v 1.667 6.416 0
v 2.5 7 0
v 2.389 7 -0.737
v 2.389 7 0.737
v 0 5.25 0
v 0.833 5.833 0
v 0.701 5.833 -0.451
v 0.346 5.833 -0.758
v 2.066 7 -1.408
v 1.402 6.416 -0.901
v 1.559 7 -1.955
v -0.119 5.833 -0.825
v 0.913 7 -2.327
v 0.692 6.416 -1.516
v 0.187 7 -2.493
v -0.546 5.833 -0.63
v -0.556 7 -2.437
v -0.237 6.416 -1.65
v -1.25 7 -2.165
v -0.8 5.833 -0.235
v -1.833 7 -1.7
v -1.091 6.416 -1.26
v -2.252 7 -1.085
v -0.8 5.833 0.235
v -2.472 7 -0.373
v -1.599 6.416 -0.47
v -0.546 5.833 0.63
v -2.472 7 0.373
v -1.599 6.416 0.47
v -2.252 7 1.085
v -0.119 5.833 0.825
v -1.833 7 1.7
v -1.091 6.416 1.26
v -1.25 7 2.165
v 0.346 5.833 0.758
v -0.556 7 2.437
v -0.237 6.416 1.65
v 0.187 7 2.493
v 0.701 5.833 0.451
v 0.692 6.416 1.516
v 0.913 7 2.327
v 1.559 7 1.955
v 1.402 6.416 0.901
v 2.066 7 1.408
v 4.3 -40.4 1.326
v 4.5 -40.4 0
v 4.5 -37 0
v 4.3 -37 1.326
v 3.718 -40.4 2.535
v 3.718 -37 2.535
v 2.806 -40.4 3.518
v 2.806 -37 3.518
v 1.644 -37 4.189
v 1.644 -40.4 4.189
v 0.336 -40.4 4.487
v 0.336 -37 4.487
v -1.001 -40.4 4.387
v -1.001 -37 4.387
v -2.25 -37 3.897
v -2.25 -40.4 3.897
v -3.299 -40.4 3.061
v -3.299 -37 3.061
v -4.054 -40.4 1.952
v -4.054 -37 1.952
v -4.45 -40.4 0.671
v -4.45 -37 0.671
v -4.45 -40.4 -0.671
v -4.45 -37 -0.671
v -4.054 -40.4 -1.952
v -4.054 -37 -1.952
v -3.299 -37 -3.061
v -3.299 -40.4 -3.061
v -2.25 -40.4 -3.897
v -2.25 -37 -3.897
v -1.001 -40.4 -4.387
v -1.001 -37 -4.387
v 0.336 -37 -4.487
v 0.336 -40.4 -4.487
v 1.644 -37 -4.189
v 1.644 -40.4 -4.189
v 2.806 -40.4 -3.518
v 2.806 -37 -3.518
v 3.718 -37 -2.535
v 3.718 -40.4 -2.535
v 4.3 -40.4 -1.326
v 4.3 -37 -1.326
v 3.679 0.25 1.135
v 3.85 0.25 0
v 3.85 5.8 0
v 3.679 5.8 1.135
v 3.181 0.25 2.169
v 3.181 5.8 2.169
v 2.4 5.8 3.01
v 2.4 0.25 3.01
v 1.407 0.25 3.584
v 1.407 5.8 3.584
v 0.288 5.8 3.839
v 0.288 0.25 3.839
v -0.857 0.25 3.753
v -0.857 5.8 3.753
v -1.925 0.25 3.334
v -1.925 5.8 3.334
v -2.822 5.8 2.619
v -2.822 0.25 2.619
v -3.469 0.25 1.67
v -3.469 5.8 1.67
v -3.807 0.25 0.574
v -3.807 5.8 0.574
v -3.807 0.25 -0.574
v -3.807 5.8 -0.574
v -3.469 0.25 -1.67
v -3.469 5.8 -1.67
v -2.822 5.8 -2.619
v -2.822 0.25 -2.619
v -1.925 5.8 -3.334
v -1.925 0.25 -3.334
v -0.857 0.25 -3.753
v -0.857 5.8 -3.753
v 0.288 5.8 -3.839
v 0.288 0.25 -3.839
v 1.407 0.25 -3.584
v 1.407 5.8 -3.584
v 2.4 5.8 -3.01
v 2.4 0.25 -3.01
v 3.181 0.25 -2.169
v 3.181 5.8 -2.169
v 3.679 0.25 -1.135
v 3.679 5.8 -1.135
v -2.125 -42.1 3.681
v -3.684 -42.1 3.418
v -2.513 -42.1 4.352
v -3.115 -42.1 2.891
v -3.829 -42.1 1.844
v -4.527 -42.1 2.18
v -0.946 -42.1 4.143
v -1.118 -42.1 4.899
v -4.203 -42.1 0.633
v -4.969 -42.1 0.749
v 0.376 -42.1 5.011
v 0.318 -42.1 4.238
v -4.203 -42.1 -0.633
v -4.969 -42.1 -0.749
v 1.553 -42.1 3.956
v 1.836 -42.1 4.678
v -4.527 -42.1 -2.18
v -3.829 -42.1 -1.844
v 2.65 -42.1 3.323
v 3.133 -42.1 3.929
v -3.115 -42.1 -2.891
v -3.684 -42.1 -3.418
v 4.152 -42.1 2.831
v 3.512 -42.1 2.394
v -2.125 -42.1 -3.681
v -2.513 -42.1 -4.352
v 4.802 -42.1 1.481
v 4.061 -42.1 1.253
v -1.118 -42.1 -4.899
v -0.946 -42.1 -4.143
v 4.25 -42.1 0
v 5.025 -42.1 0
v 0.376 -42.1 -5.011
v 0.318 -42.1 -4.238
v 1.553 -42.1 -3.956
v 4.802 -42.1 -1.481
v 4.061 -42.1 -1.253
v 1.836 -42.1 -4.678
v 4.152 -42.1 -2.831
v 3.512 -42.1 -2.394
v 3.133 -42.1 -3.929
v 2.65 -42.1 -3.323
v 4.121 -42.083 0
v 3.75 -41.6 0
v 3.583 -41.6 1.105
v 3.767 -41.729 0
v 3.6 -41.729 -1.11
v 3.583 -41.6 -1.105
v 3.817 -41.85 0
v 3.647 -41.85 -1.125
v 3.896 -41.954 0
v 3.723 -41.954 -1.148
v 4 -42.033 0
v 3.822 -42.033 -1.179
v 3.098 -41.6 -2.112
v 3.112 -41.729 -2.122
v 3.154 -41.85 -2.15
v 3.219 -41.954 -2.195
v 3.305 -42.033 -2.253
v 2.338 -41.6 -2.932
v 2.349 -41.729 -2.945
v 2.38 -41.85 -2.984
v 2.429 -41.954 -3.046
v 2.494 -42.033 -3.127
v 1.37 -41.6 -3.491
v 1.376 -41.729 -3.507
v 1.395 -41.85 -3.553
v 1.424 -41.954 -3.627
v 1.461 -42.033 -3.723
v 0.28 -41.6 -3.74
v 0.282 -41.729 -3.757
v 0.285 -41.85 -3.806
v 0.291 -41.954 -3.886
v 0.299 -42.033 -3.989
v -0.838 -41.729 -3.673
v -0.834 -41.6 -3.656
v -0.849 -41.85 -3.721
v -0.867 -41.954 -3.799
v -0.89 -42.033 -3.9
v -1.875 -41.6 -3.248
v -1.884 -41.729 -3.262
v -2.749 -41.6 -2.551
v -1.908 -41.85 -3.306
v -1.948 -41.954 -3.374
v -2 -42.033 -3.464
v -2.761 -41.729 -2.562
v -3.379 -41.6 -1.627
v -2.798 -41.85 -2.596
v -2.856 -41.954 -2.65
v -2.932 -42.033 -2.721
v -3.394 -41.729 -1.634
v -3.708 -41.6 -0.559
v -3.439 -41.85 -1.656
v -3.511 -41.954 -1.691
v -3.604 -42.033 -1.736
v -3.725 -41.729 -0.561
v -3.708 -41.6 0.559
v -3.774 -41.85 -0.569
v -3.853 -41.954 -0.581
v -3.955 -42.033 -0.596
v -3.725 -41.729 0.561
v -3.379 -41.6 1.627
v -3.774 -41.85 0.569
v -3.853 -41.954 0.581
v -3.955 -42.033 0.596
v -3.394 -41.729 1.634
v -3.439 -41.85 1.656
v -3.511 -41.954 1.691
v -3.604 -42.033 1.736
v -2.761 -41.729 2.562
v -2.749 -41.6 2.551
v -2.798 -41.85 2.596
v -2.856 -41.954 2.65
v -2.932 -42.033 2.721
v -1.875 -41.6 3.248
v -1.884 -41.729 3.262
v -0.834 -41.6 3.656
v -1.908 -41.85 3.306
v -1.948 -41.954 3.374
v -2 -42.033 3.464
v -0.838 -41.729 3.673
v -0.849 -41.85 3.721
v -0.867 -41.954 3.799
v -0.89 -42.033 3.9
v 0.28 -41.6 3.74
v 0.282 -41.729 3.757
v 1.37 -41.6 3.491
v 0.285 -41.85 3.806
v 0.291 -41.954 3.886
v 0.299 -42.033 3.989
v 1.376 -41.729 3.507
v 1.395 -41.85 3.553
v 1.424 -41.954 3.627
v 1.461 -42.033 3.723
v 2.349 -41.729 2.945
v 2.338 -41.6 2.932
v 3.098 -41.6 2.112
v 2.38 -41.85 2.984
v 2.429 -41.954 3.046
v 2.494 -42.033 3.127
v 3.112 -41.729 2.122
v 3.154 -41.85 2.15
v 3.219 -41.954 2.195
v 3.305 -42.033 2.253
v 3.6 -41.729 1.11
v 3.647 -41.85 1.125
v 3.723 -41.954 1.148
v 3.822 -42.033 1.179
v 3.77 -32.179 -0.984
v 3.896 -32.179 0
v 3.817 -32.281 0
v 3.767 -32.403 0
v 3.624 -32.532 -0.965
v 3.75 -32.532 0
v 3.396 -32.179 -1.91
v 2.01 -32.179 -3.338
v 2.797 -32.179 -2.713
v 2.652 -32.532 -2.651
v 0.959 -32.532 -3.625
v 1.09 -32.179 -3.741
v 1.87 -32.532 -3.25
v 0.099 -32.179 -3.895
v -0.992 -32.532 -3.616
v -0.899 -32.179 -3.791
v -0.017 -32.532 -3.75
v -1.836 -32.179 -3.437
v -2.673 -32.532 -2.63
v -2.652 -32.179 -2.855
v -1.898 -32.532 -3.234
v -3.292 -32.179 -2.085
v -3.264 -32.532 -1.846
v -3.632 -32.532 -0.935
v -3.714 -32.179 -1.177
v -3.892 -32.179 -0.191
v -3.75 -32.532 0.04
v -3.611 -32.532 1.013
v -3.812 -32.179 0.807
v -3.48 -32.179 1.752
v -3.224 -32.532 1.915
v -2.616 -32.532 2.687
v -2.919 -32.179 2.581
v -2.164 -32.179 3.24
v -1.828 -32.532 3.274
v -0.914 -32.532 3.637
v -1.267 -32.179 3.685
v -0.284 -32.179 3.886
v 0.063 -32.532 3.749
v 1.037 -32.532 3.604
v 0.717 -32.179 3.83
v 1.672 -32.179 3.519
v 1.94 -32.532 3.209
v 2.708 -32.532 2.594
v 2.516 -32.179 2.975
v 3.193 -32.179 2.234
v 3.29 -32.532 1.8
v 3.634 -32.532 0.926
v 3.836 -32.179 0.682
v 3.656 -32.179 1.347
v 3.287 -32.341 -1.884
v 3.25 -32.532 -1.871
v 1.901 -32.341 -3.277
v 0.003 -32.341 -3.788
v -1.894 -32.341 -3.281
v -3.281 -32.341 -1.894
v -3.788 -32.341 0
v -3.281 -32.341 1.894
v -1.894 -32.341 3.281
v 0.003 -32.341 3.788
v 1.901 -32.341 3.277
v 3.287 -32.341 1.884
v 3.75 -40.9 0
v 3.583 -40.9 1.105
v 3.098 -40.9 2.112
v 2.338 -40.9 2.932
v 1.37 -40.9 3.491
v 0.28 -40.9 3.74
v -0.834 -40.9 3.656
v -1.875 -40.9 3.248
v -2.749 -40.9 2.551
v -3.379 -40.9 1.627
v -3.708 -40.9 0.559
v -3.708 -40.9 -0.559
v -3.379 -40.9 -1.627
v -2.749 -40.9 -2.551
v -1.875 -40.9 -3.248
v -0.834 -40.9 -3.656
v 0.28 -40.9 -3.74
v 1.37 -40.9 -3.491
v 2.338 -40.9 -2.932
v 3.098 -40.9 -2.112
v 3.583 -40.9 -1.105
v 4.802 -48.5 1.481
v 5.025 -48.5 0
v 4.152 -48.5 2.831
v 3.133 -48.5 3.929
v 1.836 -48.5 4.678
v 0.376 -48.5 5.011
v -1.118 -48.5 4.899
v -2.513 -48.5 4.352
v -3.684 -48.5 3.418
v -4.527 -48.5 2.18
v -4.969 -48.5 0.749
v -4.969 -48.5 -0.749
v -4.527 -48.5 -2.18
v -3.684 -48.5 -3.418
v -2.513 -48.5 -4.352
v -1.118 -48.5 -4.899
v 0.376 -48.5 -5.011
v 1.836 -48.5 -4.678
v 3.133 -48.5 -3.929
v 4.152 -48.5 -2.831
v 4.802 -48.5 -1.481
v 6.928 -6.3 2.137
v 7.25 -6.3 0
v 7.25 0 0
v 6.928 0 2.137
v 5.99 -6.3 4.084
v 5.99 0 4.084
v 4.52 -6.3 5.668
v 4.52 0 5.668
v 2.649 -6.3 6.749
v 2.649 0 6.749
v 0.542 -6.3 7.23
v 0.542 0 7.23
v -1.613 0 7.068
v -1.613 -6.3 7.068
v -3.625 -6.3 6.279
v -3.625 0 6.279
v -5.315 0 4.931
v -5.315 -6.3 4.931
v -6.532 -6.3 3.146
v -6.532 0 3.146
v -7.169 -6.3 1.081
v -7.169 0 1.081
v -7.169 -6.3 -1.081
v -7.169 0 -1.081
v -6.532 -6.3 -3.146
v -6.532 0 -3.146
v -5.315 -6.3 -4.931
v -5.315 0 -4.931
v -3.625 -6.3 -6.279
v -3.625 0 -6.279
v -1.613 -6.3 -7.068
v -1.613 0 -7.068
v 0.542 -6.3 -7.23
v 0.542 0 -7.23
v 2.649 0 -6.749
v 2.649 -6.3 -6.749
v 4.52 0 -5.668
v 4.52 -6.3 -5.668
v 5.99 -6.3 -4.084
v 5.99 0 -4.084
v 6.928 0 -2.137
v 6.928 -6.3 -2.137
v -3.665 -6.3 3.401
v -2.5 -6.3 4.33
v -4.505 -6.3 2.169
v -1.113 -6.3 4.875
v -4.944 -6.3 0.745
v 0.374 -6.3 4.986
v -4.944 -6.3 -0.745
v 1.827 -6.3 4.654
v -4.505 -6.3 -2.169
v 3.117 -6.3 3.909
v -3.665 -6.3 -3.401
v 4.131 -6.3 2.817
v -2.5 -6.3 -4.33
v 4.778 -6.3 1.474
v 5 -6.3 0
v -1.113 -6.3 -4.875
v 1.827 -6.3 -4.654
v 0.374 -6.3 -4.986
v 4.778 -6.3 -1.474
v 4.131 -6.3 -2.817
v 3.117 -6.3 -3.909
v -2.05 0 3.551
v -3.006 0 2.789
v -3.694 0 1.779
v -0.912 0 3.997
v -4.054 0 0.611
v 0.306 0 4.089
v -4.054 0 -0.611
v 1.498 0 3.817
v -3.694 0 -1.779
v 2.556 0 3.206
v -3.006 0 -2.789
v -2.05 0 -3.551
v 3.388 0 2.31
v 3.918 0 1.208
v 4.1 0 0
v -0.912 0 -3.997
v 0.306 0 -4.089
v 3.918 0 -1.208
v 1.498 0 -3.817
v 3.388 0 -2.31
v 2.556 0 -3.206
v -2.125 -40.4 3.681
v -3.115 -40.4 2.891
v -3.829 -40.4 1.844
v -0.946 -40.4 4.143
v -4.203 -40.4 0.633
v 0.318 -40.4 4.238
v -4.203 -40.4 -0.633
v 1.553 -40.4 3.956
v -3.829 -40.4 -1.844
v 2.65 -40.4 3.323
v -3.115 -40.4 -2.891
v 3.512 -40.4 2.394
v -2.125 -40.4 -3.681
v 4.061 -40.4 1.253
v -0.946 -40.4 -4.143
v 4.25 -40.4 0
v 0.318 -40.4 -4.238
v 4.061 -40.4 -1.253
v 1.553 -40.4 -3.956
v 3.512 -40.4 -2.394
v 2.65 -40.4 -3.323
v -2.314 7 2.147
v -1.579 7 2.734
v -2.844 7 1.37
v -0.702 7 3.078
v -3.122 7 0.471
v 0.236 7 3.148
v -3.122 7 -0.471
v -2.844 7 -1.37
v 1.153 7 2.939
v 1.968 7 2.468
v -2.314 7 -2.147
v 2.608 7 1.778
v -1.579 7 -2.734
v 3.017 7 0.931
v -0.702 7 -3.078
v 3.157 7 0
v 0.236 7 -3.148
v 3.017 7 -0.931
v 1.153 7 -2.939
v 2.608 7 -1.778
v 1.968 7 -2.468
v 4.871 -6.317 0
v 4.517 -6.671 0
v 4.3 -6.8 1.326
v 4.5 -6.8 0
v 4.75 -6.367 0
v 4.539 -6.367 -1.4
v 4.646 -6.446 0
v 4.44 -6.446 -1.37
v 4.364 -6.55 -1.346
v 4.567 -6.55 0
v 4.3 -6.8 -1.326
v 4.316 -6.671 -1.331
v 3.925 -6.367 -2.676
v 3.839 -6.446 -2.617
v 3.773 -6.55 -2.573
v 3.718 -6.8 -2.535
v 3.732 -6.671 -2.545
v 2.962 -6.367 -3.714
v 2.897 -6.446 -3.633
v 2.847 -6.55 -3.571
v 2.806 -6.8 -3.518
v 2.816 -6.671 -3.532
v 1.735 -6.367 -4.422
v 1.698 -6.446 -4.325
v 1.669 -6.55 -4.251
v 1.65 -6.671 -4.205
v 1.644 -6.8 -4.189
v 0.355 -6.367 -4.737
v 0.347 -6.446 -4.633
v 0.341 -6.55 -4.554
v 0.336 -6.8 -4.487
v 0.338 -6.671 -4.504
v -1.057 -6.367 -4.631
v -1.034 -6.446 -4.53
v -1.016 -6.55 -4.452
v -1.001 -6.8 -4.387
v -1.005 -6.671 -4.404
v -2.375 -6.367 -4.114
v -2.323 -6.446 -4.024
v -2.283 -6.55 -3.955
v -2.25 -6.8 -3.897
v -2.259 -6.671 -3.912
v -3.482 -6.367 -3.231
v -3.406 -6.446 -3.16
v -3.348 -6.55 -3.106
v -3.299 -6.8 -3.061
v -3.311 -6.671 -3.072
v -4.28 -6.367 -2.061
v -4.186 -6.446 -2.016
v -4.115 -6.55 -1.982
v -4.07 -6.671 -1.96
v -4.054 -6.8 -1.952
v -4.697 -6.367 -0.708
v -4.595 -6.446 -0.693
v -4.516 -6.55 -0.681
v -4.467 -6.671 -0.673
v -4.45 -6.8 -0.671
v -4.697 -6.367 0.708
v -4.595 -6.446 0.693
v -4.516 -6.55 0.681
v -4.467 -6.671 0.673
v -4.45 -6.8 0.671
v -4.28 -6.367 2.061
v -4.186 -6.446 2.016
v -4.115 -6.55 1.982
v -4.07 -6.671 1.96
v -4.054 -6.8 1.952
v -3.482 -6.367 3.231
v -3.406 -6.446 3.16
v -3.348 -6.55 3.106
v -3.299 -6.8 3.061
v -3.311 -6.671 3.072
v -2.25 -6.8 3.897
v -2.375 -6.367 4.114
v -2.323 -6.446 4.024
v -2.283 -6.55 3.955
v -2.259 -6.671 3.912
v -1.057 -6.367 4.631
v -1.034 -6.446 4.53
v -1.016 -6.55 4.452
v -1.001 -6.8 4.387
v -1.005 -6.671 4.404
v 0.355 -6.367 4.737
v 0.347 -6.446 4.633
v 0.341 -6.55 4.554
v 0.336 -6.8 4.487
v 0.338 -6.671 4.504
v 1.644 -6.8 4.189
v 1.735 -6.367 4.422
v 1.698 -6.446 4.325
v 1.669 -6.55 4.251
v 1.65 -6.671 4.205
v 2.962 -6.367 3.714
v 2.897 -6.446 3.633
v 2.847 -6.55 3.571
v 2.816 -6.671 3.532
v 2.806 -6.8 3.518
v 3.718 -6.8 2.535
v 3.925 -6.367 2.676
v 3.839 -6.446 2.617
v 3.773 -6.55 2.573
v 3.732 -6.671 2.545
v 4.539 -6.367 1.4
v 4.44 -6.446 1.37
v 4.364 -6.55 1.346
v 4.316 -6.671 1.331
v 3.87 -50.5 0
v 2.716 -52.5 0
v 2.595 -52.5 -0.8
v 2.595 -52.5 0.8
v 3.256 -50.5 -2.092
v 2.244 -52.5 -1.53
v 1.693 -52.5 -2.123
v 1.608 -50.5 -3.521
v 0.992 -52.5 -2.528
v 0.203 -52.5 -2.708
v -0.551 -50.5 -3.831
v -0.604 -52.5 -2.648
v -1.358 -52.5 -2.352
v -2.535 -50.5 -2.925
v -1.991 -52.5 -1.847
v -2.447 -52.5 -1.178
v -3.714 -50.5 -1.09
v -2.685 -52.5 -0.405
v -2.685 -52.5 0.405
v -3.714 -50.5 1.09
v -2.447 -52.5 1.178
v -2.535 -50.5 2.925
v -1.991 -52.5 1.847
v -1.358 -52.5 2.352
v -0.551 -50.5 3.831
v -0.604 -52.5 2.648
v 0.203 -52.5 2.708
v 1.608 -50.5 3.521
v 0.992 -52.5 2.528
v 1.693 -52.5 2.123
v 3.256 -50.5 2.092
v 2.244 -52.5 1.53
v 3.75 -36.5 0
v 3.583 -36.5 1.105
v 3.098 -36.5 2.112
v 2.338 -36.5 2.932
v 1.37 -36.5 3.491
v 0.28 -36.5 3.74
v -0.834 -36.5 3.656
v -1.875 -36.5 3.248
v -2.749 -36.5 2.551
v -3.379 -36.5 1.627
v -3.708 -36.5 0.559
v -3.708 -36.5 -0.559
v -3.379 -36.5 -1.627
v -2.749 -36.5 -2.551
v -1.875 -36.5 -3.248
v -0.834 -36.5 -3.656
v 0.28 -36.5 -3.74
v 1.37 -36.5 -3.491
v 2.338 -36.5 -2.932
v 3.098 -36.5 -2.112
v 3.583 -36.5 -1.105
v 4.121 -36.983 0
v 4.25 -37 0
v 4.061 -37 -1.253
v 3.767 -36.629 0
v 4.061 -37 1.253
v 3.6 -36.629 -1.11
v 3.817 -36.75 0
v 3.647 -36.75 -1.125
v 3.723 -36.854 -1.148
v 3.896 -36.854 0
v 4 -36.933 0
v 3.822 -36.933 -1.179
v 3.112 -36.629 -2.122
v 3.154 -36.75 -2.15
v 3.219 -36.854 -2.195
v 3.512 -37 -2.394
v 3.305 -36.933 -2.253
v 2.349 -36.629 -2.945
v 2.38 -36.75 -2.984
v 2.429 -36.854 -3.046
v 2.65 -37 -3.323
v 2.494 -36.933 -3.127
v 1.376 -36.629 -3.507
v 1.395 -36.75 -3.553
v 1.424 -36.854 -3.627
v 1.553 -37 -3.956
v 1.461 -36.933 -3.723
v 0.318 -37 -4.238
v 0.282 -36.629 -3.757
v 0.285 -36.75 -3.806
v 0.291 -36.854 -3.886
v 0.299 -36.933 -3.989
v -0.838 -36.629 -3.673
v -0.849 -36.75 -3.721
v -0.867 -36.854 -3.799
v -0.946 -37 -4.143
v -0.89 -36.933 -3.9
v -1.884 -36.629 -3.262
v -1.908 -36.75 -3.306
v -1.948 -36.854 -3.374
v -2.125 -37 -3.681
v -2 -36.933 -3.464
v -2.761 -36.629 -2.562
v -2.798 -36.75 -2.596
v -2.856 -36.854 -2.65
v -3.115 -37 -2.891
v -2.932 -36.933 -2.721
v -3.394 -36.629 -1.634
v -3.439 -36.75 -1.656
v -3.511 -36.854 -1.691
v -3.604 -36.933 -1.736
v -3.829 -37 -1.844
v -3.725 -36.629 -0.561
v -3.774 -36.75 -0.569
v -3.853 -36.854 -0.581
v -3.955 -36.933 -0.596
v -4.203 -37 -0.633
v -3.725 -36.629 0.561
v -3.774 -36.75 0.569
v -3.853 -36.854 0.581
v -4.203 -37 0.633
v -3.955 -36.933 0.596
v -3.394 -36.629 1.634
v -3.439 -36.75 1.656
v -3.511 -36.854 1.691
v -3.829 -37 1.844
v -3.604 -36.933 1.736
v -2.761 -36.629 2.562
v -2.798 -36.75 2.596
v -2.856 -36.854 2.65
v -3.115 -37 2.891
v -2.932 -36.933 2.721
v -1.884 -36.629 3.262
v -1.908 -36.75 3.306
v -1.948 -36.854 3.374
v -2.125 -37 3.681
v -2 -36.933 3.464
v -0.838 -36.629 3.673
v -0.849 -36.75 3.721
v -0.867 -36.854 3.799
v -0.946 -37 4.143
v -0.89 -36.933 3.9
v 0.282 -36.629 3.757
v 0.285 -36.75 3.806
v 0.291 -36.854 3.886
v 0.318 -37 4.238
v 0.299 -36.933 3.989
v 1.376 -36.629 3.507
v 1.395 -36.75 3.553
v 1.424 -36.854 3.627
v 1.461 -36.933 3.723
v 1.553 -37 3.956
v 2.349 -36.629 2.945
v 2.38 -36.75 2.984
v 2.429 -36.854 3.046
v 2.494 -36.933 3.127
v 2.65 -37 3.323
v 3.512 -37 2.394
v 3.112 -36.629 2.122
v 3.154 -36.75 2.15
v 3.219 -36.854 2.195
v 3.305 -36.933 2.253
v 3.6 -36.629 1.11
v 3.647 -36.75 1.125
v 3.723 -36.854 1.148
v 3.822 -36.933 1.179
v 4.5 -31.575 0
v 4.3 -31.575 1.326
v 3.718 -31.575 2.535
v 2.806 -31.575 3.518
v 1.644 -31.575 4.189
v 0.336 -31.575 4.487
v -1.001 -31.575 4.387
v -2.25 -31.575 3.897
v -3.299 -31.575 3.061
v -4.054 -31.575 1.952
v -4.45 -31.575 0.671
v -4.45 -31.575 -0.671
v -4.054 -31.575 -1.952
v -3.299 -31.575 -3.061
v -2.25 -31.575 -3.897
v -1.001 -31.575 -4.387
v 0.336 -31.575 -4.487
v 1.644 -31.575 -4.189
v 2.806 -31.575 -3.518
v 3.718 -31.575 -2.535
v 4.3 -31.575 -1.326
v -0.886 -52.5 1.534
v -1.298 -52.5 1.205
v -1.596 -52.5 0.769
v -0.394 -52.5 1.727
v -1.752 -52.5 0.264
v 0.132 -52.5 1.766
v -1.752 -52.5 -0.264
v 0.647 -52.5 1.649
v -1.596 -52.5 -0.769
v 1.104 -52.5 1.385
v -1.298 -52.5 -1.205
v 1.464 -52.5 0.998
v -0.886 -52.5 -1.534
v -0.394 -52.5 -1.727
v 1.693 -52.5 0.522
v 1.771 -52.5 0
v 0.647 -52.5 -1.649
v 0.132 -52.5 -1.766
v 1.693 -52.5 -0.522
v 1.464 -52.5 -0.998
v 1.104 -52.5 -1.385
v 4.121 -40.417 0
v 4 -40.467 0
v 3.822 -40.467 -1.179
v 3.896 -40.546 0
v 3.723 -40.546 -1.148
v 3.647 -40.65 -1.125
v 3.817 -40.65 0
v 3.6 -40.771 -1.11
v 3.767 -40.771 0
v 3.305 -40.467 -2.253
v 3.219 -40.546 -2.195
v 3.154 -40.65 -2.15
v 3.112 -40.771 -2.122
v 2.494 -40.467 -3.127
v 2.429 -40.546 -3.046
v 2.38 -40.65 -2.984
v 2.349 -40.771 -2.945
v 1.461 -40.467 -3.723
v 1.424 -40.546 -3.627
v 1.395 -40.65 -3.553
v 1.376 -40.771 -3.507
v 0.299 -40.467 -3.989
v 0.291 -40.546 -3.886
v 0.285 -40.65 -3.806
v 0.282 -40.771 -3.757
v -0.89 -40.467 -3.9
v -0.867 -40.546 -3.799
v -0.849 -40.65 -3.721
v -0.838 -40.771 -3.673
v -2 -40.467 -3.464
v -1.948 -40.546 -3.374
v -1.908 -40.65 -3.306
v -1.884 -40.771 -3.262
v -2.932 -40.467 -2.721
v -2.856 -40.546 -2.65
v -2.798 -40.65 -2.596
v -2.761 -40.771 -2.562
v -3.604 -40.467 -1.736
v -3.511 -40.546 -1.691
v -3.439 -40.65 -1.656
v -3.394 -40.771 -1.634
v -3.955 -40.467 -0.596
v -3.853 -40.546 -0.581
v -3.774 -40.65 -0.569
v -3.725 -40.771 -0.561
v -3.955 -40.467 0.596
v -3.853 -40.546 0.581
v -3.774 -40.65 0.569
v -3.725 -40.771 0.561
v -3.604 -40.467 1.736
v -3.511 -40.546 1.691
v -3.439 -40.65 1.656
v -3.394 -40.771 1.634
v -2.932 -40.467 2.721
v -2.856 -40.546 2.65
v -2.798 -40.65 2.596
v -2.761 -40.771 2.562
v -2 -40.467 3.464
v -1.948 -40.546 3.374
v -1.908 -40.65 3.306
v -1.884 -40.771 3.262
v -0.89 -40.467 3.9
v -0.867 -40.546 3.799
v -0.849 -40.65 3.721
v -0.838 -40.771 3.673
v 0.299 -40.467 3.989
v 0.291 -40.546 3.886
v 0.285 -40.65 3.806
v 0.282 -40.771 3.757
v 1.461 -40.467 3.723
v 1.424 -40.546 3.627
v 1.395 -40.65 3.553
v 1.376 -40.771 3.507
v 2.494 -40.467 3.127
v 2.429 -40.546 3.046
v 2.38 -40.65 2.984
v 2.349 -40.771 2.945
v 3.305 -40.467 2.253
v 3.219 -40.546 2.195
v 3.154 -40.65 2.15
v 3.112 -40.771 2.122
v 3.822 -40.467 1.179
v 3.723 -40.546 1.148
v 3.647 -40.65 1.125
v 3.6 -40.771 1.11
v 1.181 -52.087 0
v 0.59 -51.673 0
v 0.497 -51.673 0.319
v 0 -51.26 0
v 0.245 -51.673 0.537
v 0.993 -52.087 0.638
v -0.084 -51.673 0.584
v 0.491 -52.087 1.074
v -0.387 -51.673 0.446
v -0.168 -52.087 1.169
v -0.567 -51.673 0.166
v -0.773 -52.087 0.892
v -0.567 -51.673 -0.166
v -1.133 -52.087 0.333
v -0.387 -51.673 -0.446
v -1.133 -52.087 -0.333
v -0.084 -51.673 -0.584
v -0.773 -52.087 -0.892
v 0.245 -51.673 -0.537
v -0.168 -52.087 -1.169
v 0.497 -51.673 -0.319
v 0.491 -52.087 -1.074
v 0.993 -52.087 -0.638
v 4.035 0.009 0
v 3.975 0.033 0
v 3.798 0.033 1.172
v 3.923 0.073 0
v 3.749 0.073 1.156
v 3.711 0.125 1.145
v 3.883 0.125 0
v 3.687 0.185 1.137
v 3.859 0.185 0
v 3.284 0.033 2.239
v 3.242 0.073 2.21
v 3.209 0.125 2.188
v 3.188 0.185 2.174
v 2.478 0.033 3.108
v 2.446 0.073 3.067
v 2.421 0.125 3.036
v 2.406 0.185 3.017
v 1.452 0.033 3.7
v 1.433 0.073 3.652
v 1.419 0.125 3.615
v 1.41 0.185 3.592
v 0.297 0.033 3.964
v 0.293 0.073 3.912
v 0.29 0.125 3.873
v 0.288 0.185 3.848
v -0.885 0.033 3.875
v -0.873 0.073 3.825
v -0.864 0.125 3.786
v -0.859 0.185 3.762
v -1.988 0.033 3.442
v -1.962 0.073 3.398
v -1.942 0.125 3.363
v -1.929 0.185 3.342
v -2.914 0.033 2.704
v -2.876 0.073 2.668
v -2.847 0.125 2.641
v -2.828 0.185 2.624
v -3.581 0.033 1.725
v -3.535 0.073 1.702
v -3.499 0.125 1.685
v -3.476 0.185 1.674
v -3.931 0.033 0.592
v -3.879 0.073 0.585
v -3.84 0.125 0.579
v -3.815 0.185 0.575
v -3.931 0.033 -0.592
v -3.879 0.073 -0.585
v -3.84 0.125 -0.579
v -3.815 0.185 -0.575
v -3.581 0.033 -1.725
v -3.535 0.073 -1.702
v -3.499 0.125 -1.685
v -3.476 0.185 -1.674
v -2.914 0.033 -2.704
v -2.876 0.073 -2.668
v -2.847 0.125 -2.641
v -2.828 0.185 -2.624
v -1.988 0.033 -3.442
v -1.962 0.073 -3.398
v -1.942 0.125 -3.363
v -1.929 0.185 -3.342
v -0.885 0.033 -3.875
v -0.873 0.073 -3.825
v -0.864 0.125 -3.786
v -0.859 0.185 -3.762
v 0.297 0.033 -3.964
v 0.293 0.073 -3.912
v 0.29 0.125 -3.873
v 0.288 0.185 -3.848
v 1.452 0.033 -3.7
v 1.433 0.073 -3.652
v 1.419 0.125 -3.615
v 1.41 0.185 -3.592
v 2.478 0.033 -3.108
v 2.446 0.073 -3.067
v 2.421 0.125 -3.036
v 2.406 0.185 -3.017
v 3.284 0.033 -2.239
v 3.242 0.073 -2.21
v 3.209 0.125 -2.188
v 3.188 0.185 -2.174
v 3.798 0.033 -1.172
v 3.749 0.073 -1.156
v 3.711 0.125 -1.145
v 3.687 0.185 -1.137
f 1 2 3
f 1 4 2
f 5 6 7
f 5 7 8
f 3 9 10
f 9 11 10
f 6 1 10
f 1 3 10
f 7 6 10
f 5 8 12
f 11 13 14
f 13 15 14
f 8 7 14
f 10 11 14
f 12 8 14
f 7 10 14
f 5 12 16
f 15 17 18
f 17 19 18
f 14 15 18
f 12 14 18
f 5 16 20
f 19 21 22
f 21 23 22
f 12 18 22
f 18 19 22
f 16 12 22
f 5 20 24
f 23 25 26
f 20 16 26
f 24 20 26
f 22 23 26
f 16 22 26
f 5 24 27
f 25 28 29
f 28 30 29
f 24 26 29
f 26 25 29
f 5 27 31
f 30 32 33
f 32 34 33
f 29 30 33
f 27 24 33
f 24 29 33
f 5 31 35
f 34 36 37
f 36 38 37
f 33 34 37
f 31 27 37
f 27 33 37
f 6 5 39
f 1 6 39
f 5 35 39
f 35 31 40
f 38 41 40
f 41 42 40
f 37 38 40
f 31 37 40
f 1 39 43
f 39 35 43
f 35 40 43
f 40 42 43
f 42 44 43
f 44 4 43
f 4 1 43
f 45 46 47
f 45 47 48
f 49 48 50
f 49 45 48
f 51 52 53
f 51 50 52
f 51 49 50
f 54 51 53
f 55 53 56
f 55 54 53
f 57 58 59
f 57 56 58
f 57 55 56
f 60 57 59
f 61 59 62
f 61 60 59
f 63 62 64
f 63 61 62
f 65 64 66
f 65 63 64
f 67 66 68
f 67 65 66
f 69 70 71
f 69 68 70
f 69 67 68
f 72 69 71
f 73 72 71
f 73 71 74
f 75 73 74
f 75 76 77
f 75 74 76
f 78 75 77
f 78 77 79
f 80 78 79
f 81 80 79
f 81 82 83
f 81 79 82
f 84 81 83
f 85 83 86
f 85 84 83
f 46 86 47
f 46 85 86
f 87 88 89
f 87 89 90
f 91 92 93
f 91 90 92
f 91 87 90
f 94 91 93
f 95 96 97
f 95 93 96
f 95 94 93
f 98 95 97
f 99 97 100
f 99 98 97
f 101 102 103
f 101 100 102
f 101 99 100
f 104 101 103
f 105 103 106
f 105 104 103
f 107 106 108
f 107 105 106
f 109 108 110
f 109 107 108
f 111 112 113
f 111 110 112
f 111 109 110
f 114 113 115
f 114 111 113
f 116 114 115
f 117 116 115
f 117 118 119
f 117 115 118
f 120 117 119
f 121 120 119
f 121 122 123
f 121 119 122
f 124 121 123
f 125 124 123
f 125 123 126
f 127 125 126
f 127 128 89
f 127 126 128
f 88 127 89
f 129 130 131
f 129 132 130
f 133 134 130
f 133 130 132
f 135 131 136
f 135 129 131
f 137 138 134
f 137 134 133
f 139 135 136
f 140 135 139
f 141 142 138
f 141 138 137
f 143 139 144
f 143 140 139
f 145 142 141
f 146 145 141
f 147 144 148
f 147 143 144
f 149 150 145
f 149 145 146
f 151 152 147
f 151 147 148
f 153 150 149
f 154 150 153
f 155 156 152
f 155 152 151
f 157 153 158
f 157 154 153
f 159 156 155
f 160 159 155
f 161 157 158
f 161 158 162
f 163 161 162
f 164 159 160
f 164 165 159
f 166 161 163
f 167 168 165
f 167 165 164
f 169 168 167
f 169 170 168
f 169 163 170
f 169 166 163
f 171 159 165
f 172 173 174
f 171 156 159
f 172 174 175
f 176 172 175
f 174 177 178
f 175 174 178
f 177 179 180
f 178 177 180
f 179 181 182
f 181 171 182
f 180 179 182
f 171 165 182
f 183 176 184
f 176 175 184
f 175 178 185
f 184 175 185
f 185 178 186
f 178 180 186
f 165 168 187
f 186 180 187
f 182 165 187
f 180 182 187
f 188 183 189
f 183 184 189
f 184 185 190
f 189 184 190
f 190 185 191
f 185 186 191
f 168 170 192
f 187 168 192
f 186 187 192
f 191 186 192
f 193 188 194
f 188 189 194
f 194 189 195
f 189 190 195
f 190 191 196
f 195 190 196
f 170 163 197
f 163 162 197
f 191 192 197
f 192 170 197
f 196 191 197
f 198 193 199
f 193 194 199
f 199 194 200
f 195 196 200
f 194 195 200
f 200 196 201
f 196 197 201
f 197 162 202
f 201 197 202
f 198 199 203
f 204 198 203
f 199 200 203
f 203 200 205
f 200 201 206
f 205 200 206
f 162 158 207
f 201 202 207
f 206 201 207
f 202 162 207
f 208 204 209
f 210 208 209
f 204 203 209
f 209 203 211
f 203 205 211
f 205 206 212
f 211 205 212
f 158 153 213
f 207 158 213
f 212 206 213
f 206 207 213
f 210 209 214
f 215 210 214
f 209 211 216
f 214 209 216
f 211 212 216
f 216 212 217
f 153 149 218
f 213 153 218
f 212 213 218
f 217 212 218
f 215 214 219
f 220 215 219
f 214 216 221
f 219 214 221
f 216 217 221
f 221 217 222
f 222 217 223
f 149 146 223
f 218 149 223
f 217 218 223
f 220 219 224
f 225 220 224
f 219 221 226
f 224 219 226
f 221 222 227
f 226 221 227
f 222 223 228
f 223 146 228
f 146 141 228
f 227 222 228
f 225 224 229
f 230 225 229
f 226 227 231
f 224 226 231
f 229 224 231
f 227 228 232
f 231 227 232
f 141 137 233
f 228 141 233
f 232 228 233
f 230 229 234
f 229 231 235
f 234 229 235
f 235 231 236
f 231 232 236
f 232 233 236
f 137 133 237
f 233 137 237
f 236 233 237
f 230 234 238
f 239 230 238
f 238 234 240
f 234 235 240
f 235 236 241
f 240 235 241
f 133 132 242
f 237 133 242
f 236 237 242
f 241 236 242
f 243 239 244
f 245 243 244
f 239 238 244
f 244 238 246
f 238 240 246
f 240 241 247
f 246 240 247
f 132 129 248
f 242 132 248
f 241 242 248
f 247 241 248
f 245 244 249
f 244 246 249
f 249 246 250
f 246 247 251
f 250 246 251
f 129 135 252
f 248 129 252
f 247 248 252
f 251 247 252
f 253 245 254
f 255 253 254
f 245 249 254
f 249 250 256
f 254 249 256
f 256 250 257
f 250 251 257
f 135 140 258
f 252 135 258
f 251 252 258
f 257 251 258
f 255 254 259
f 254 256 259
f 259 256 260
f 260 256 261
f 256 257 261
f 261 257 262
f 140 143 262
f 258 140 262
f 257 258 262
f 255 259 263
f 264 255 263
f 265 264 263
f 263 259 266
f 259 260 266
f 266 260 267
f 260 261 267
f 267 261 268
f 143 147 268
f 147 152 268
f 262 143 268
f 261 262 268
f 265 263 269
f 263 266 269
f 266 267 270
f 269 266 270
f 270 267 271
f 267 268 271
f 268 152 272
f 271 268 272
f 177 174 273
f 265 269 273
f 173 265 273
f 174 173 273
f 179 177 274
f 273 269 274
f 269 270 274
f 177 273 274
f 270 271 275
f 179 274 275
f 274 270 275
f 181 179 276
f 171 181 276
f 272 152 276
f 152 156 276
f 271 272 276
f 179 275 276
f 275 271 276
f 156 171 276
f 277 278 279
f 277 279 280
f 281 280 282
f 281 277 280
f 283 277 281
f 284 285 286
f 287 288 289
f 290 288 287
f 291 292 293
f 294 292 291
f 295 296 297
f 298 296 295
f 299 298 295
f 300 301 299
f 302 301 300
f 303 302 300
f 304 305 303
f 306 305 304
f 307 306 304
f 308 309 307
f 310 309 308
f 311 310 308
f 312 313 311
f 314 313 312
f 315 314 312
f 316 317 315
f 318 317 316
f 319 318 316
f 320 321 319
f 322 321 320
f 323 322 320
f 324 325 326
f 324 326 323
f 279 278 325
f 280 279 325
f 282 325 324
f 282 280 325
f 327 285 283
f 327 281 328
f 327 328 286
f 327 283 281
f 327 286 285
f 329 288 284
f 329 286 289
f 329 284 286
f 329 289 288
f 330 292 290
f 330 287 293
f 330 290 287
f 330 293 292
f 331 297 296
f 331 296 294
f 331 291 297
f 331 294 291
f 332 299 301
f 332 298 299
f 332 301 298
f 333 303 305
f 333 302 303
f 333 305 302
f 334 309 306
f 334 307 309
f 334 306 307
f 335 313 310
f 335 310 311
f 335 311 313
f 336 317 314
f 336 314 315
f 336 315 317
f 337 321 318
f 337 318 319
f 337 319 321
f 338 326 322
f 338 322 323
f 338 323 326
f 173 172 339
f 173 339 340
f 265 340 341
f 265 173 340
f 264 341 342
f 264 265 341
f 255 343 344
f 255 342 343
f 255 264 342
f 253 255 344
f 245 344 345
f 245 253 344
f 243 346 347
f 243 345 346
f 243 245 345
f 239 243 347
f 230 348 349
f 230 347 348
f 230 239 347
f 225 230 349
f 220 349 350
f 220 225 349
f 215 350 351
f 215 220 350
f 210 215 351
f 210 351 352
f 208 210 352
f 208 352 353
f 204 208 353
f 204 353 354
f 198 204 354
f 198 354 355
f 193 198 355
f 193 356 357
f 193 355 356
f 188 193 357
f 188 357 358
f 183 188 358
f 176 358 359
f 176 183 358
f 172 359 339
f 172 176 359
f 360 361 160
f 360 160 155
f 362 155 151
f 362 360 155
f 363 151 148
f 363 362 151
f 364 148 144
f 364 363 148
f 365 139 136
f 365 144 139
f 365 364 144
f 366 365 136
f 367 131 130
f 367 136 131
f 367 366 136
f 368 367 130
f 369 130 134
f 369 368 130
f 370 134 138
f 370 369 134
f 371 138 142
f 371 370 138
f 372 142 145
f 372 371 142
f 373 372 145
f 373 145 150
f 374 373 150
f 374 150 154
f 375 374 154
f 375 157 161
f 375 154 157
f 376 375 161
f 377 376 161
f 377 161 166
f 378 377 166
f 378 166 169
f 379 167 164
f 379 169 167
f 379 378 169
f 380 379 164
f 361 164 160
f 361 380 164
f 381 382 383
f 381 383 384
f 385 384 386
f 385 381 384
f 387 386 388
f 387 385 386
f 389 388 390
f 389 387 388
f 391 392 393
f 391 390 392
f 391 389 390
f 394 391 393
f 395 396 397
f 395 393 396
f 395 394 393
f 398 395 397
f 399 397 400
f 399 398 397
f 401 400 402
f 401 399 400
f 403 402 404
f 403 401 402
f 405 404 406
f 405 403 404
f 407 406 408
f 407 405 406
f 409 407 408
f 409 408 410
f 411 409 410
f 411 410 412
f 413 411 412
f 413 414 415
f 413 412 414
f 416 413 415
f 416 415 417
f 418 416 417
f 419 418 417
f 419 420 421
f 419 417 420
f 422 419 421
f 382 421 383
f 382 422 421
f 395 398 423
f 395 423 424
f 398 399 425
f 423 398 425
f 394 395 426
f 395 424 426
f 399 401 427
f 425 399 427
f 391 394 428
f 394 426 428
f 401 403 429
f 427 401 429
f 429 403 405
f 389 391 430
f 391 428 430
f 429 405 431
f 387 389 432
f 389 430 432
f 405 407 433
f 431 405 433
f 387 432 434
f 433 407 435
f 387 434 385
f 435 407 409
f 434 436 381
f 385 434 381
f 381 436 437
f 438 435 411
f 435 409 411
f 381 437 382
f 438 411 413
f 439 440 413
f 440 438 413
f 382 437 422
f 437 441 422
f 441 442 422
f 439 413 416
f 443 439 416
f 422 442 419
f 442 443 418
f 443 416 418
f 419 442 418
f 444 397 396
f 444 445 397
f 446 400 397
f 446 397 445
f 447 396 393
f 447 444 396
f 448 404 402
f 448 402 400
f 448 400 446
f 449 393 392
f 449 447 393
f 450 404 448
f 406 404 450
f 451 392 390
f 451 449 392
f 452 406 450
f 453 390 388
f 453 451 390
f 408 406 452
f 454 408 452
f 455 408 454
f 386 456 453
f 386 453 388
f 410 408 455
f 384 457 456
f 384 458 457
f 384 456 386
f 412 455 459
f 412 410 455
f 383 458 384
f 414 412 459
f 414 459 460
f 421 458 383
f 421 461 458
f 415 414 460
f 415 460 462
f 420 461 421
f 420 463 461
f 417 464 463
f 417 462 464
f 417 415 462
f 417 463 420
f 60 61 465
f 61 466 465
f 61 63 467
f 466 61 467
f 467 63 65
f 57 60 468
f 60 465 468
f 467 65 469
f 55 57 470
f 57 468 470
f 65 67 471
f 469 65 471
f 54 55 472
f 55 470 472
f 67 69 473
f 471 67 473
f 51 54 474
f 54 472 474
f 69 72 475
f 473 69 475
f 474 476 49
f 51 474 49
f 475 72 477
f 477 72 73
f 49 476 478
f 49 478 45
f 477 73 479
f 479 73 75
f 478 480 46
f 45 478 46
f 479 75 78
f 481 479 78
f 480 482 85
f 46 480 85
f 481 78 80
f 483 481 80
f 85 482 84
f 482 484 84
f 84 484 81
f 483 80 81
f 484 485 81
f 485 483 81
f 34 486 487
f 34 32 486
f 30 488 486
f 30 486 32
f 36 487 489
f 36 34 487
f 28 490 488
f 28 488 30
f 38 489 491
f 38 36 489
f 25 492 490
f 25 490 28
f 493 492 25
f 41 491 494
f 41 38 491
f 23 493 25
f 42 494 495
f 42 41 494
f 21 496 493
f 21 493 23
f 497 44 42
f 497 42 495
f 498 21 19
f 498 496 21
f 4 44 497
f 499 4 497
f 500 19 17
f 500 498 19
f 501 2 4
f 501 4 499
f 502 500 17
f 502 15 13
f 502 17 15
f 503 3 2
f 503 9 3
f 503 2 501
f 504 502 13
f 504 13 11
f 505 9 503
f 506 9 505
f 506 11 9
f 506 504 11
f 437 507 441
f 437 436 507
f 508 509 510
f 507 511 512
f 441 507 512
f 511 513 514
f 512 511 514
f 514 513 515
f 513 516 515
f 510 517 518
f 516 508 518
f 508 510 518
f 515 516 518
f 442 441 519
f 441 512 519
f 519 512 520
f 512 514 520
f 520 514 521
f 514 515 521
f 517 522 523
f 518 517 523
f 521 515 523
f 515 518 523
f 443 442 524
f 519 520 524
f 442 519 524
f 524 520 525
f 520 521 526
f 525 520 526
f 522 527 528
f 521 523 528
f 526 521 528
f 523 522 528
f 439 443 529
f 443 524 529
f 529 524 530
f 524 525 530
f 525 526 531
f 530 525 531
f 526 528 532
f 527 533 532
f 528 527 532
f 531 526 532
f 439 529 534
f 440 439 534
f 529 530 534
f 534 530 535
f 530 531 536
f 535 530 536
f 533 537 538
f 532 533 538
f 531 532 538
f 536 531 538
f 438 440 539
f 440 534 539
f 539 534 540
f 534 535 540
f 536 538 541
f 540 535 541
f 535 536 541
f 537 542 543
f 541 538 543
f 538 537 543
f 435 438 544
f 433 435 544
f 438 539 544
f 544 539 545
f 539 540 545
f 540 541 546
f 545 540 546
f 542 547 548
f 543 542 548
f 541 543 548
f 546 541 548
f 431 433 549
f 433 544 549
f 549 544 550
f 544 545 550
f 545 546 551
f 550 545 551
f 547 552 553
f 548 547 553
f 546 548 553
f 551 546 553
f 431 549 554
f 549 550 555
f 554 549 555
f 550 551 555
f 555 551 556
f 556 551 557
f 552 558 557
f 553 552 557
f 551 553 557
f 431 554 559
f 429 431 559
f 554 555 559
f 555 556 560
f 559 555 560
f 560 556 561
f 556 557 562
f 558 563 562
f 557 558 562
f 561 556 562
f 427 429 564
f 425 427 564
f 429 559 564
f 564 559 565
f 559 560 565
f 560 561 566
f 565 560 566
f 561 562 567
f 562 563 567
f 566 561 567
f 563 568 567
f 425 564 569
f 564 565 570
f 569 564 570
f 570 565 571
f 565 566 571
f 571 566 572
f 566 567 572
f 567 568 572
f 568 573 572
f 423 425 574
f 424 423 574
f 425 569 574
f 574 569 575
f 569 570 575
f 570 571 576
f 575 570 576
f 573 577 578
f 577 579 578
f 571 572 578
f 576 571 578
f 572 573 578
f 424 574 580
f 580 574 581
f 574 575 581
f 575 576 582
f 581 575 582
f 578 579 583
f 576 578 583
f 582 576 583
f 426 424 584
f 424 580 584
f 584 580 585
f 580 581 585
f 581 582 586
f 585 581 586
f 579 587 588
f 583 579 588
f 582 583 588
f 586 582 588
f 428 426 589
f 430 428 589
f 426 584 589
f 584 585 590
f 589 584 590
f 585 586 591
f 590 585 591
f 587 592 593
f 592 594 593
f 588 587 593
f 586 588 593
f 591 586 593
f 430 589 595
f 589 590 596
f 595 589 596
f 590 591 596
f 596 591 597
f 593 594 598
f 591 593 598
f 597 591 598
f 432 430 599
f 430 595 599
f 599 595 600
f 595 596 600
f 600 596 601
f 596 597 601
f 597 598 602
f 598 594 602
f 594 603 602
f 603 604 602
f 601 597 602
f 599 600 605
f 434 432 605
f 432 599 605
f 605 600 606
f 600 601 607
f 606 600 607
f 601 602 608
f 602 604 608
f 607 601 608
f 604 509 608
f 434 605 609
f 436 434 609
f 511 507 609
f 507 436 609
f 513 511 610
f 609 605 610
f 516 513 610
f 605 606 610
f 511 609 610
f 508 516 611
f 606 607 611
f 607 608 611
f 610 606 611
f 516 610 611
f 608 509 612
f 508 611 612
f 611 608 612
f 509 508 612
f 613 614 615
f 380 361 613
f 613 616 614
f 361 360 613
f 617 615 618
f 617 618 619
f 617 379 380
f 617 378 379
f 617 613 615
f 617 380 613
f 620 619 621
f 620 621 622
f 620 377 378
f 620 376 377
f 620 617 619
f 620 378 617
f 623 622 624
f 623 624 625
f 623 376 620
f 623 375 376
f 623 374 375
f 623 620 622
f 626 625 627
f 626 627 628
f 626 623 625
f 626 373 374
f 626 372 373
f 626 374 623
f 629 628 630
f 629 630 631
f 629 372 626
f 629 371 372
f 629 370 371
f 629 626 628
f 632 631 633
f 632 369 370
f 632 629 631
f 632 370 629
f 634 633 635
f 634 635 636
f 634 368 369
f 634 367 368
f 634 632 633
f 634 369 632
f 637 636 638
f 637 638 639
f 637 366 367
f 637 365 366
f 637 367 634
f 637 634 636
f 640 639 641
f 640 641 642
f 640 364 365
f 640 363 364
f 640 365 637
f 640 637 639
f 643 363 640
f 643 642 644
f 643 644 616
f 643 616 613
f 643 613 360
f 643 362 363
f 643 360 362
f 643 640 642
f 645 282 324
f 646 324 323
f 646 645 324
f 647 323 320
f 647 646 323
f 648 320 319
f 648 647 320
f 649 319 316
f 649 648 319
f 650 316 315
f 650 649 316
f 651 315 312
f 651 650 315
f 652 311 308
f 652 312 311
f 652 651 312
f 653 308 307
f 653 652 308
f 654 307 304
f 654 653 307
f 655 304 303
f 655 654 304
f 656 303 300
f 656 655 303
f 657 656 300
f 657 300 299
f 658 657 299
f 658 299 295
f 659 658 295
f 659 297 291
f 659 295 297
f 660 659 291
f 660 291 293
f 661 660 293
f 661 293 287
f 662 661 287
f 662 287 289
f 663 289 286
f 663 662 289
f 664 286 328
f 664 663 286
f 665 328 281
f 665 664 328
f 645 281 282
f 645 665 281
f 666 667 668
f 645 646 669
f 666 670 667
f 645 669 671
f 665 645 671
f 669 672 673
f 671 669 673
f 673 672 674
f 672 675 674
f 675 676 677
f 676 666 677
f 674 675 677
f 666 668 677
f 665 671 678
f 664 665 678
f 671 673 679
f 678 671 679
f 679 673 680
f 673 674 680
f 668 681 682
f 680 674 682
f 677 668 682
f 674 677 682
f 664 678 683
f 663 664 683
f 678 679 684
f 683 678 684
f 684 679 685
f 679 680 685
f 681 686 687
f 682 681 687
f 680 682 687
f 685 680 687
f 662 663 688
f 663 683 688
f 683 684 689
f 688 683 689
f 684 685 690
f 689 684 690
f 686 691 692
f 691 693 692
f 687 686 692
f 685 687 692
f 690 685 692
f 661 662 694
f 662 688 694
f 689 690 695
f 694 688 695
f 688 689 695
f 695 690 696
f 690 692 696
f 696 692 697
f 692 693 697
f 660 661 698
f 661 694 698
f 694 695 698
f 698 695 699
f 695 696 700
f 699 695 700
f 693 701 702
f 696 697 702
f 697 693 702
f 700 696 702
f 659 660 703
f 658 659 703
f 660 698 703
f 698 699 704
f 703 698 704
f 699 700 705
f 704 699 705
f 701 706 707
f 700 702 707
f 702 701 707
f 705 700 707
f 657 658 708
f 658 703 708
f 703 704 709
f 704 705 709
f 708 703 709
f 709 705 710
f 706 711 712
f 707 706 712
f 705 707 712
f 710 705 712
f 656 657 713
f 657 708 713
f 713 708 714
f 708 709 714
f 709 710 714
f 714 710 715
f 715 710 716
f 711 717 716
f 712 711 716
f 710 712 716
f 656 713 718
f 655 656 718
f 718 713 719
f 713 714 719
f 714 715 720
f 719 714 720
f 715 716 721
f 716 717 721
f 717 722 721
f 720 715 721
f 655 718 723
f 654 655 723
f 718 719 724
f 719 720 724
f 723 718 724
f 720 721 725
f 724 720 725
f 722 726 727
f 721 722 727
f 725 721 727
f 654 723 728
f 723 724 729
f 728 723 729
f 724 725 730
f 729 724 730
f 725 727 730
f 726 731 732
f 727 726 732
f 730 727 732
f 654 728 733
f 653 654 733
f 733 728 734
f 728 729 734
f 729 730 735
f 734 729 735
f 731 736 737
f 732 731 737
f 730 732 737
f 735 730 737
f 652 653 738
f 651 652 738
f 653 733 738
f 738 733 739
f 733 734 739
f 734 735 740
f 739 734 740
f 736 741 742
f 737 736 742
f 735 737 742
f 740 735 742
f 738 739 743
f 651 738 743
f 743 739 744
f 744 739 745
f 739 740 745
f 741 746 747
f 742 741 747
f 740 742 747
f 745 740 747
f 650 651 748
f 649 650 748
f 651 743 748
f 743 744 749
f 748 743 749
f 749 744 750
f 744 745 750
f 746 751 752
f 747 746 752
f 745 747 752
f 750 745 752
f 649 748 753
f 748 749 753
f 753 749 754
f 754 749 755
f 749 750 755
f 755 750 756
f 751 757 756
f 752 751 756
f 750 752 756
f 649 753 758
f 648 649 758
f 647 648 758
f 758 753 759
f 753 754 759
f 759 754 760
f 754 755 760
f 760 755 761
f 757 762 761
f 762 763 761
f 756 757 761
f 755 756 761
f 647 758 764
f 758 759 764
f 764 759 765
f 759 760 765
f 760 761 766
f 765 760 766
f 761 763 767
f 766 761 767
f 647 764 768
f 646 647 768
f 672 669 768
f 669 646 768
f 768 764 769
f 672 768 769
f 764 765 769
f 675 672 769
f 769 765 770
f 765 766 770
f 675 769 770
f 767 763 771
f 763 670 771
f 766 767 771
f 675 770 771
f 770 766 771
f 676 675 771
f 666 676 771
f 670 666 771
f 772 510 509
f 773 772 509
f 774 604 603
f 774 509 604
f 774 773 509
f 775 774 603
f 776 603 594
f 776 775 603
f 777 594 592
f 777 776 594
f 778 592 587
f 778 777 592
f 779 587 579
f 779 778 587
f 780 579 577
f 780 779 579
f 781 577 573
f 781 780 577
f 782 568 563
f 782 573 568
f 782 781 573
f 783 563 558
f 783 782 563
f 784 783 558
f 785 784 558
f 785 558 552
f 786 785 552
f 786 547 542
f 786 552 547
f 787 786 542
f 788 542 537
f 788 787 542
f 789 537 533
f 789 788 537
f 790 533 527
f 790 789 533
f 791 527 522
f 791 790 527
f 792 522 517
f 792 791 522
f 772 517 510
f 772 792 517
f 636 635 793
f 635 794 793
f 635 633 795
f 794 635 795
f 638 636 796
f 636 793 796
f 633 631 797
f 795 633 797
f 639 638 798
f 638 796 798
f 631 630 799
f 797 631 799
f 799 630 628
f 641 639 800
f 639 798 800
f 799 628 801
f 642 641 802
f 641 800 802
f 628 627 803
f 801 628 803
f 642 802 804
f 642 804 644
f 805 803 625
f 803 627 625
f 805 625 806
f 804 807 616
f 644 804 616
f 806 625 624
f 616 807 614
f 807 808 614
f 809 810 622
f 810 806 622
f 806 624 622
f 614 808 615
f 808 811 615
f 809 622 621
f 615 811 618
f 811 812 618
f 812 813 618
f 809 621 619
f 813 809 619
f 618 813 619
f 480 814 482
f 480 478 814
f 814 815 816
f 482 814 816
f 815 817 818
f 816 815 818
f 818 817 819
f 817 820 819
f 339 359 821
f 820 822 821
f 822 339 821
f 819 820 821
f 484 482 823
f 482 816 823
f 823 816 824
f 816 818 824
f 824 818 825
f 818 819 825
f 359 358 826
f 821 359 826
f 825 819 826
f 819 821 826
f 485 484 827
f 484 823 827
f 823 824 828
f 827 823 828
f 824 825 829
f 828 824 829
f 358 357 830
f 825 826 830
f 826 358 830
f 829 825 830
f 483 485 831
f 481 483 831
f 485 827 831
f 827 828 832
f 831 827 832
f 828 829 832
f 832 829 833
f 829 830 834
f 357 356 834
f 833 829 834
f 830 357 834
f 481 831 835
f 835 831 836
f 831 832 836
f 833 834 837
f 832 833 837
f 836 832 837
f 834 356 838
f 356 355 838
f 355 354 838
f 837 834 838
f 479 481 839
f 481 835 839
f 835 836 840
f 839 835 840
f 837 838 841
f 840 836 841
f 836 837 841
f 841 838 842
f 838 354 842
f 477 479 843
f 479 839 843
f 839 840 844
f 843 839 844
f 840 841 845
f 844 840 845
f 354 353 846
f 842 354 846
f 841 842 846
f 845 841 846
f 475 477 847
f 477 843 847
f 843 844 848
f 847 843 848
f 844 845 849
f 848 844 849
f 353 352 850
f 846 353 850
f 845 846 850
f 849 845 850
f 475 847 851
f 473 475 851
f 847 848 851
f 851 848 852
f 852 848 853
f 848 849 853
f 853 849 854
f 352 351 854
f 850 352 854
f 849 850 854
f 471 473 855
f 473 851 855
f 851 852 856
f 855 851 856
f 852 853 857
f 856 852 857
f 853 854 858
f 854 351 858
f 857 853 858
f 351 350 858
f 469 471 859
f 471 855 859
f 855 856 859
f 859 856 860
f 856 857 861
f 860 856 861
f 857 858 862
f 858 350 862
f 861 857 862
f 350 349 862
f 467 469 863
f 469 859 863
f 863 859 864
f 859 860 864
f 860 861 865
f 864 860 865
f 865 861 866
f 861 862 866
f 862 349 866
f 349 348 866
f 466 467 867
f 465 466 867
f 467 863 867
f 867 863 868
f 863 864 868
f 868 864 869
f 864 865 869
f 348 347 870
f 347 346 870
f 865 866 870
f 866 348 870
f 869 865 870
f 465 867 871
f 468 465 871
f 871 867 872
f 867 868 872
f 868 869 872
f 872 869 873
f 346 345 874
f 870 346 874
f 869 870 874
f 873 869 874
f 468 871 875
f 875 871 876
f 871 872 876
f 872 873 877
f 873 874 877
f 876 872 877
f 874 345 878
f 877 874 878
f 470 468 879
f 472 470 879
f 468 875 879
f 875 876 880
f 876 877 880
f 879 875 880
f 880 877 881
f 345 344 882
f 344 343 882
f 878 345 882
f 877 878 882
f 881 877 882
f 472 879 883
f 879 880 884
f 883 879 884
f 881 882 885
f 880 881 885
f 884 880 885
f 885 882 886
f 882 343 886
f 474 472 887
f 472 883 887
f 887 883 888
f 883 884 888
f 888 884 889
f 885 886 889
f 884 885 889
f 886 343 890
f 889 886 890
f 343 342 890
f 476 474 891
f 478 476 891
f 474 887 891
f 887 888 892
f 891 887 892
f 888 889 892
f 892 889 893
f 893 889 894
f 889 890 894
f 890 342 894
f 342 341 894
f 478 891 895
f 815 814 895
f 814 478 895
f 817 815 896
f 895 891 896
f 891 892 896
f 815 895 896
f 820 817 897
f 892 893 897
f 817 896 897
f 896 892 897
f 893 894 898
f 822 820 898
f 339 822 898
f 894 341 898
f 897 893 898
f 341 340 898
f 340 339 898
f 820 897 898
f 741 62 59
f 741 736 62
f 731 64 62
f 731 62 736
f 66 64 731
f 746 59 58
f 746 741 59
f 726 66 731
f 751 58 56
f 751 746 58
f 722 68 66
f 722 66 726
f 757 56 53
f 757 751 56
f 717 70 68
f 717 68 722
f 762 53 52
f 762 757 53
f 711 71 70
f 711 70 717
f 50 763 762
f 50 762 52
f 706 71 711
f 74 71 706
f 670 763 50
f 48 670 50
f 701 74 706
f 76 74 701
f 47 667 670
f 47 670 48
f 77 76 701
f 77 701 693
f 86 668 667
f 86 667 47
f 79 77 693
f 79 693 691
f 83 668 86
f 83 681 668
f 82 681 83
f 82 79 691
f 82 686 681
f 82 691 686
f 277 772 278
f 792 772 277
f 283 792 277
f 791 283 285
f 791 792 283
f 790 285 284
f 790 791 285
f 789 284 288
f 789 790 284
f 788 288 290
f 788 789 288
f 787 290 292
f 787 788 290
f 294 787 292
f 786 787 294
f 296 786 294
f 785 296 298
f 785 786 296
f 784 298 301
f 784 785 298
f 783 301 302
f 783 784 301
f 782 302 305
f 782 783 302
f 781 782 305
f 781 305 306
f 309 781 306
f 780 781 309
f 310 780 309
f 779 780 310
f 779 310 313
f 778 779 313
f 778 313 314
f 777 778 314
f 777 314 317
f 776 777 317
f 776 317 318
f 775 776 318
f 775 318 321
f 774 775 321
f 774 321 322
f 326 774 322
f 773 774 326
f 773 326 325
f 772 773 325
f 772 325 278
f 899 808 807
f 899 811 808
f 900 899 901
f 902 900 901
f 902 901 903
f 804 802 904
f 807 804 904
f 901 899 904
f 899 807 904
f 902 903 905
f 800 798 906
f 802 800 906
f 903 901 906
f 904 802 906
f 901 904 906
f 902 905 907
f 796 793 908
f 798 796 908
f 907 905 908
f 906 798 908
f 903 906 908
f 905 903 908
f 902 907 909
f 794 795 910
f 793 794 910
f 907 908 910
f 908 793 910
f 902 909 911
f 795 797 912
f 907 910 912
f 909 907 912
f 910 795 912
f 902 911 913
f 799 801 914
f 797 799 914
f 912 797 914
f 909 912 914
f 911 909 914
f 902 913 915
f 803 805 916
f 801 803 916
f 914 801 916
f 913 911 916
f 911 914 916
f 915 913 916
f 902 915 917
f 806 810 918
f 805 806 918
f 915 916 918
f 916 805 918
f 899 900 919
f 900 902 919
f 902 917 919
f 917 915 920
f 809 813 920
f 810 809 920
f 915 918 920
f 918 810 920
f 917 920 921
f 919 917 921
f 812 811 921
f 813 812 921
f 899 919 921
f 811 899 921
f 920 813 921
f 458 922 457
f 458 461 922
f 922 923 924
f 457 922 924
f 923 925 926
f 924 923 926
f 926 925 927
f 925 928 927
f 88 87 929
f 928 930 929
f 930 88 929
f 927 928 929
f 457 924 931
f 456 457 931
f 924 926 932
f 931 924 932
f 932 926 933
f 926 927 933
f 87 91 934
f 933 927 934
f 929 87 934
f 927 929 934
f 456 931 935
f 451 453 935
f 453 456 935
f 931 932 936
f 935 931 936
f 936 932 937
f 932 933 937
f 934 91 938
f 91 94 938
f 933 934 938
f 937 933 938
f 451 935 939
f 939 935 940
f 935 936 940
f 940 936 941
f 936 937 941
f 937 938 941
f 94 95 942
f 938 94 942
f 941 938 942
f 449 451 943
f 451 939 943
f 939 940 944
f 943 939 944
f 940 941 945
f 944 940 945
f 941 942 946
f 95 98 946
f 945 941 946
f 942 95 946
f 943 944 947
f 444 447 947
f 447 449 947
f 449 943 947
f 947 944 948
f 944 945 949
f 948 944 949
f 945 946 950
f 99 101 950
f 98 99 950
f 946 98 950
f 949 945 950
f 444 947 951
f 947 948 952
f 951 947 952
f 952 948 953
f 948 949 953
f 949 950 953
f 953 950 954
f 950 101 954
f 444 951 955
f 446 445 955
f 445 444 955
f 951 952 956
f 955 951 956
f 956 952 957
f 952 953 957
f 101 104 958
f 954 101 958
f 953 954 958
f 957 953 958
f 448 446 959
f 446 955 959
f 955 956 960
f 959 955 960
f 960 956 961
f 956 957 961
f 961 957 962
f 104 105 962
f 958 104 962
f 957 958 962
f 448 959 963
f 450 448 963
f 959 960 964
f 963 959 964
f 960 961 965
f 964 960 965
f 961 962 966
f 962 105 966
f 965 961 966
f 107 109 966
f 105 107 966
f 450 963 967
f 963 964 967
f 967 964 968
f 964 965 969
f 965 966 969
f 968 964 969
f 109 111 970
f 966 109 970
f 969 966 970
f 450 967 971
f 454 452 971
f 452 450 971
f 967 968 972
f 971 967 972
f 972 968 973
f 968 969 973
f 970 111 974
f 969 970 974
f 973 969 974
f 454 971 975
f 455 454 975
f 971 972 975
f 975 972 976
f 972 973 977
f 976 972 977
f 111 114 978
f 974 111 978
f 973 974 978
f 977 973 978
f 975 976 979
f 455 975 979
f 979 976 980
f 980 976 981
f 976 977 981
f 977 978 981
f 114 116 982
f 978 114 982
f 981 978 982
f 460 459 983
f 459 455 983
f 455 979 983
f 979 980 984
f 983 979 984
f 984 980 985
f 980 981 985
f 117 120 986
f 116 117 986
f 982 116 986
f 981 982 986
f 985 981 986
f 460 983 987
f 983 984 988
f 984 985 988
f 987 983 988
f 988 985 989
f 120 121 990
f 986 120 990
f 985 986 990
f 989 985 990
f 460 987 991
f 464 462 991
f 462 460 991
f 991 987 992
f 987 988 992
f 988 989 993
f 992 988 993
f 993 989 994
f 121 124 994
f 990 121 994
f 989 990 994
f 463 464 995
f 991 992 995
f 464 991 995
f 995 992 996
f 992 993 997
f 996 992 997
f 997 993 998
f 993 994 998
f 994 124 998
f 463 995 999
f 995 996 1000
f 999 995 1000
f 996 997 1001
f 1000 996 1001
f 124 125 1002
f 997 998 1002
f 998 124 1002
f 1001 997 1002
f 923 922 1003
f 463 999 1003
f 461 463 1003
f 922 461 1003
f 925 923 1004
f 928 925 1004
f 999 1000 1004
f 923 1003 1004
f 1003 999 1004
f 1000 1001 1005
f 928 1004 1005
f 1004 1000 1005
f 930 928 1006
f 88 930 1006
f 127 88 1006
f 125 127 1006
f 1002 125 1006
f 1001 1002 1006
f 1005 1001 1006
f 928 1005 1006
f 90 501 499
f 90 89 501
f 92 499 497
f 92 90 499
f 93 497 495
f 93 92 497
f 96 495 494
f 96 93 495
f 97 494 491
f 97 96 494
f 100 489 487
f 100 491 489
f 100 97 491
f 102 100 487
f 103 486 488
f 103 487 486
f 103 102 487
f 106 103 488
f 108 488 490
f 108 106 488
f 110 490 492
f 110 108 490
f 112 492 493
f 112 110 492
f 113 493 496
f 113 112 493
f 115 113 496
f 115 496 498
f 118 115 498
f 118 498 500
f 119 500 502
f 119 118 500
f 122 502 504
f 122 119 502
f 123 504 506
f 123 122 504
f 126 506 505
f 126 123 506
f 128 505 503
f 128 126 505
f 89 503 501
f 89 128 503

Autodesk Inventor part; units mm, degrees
ref_plane "YZ Plane" through (0, 0, 0) normal (1, 0, 0) x (0, 1, 0)
ref_plane "XZ Plane" through (0, 0, 0) normal (0, 1, 0) x (-1, 0, 0)
ref_plane "XY Plane" through (0, 0, 0) normal (0, 0, 1) x (1, 0, 0)
sketch "Sketch1" plane through (0, 0, 0) normal (0, 0, 1) x (1, 0, 0)
  line L0 (0, 18.9) -> (0, -64.4) projected
  line L1 (-1.45, 0) -> (8.7, 0) projected
  line L2 (0, 5.2495) -> (2.5, 7)
  line L3 (2.5, 7) -> (3.157, 7)
  line L4 (3.157, 7) -> (3.85, 5.8)
  line L5 (3.85, 5.8) -> (3.85, 0)
  line L6 (3.85, 0) -> (7.25, 0)
  line L7 (7.25, 0) -> (7.25, -6.3)
  line L8 (7.25, -6.3) -> (4.5, -6.3)
  line L9 (4.5, -6.3) -> (4.5, -31.575)
  line L10 (4.5, -31.575) -> (3.75, -32.325)
  line L11 (3.75, -32.325) -> (3.75, -37)
  line L12 (3.75, -37) -> (4.5, -37)
  line L13 (4.5, -37) -> (4.5, -40.4)
  line L14 (4.5, -40.4) -> (3.75, -40.4)
  line L15 (3.75, -40.4) -> (3.75, -42.1)
  line L16 (3.75, -42.1) -> (5.025, -42.1)
  line L17 (5.025, -42.1) -> (5.025, -48.5)
  line L18 (5.025, -48.5) -> (2.7156, -52.5)
  line L19 (2.7156, -52.5) -> (1.7713, -52.5)
  line L20 (1.7713, -52.5) -> (0, -51.2597)
  line L21 (0, -51.2597) -> (0, 5.2495)
  point P0 (0, 0)
  dimension "d0" = 7
  dimension "d1" = 3.85
  dimension "d2" = 1.2
  dimension "d3" = 3.157
  dimension "d4" = 35
  dimension "d5" = 2.5
  dimension "d7" = 7.25
  dimension "d8" = 6.3
  dimension "d9" = 4.5
  dimension "d10" = 3.75
  dimension "d13" = 45
  dimension "d14" = 5.425
  dimension "d15" = 4.5
  dimension "d16" = 3.4
  dimension "d17" = 3.75
  dimension "d18" = 1.7
  dimension "d19" = 5.025
  dimension "d20" = 52.5
  dimension "d21" = 35
  dimension "d22" = 30
  dimension "d23" = 6.4
  dimension "d28" = 0.9443
  dimension "d29" = 4
revolve "Revolution1" add sketch "Sketch1" angle 360 about axis through (0, -51.2597, 0) along (0, 1, 0)
fillet "Fillet1" radius 0.5 5 edges at (-3.75, -42.1, 0) (-3.75, -40.4, 0) (-3.75, -32.325, 0) (-4.5, -6.3, 0) (-3.75, -37, 0)
fillet "Fillet2" radius 0.25 1 edges at (-3.85, 0, 0)
properties part number "100-03" material "Stainless Steel"
